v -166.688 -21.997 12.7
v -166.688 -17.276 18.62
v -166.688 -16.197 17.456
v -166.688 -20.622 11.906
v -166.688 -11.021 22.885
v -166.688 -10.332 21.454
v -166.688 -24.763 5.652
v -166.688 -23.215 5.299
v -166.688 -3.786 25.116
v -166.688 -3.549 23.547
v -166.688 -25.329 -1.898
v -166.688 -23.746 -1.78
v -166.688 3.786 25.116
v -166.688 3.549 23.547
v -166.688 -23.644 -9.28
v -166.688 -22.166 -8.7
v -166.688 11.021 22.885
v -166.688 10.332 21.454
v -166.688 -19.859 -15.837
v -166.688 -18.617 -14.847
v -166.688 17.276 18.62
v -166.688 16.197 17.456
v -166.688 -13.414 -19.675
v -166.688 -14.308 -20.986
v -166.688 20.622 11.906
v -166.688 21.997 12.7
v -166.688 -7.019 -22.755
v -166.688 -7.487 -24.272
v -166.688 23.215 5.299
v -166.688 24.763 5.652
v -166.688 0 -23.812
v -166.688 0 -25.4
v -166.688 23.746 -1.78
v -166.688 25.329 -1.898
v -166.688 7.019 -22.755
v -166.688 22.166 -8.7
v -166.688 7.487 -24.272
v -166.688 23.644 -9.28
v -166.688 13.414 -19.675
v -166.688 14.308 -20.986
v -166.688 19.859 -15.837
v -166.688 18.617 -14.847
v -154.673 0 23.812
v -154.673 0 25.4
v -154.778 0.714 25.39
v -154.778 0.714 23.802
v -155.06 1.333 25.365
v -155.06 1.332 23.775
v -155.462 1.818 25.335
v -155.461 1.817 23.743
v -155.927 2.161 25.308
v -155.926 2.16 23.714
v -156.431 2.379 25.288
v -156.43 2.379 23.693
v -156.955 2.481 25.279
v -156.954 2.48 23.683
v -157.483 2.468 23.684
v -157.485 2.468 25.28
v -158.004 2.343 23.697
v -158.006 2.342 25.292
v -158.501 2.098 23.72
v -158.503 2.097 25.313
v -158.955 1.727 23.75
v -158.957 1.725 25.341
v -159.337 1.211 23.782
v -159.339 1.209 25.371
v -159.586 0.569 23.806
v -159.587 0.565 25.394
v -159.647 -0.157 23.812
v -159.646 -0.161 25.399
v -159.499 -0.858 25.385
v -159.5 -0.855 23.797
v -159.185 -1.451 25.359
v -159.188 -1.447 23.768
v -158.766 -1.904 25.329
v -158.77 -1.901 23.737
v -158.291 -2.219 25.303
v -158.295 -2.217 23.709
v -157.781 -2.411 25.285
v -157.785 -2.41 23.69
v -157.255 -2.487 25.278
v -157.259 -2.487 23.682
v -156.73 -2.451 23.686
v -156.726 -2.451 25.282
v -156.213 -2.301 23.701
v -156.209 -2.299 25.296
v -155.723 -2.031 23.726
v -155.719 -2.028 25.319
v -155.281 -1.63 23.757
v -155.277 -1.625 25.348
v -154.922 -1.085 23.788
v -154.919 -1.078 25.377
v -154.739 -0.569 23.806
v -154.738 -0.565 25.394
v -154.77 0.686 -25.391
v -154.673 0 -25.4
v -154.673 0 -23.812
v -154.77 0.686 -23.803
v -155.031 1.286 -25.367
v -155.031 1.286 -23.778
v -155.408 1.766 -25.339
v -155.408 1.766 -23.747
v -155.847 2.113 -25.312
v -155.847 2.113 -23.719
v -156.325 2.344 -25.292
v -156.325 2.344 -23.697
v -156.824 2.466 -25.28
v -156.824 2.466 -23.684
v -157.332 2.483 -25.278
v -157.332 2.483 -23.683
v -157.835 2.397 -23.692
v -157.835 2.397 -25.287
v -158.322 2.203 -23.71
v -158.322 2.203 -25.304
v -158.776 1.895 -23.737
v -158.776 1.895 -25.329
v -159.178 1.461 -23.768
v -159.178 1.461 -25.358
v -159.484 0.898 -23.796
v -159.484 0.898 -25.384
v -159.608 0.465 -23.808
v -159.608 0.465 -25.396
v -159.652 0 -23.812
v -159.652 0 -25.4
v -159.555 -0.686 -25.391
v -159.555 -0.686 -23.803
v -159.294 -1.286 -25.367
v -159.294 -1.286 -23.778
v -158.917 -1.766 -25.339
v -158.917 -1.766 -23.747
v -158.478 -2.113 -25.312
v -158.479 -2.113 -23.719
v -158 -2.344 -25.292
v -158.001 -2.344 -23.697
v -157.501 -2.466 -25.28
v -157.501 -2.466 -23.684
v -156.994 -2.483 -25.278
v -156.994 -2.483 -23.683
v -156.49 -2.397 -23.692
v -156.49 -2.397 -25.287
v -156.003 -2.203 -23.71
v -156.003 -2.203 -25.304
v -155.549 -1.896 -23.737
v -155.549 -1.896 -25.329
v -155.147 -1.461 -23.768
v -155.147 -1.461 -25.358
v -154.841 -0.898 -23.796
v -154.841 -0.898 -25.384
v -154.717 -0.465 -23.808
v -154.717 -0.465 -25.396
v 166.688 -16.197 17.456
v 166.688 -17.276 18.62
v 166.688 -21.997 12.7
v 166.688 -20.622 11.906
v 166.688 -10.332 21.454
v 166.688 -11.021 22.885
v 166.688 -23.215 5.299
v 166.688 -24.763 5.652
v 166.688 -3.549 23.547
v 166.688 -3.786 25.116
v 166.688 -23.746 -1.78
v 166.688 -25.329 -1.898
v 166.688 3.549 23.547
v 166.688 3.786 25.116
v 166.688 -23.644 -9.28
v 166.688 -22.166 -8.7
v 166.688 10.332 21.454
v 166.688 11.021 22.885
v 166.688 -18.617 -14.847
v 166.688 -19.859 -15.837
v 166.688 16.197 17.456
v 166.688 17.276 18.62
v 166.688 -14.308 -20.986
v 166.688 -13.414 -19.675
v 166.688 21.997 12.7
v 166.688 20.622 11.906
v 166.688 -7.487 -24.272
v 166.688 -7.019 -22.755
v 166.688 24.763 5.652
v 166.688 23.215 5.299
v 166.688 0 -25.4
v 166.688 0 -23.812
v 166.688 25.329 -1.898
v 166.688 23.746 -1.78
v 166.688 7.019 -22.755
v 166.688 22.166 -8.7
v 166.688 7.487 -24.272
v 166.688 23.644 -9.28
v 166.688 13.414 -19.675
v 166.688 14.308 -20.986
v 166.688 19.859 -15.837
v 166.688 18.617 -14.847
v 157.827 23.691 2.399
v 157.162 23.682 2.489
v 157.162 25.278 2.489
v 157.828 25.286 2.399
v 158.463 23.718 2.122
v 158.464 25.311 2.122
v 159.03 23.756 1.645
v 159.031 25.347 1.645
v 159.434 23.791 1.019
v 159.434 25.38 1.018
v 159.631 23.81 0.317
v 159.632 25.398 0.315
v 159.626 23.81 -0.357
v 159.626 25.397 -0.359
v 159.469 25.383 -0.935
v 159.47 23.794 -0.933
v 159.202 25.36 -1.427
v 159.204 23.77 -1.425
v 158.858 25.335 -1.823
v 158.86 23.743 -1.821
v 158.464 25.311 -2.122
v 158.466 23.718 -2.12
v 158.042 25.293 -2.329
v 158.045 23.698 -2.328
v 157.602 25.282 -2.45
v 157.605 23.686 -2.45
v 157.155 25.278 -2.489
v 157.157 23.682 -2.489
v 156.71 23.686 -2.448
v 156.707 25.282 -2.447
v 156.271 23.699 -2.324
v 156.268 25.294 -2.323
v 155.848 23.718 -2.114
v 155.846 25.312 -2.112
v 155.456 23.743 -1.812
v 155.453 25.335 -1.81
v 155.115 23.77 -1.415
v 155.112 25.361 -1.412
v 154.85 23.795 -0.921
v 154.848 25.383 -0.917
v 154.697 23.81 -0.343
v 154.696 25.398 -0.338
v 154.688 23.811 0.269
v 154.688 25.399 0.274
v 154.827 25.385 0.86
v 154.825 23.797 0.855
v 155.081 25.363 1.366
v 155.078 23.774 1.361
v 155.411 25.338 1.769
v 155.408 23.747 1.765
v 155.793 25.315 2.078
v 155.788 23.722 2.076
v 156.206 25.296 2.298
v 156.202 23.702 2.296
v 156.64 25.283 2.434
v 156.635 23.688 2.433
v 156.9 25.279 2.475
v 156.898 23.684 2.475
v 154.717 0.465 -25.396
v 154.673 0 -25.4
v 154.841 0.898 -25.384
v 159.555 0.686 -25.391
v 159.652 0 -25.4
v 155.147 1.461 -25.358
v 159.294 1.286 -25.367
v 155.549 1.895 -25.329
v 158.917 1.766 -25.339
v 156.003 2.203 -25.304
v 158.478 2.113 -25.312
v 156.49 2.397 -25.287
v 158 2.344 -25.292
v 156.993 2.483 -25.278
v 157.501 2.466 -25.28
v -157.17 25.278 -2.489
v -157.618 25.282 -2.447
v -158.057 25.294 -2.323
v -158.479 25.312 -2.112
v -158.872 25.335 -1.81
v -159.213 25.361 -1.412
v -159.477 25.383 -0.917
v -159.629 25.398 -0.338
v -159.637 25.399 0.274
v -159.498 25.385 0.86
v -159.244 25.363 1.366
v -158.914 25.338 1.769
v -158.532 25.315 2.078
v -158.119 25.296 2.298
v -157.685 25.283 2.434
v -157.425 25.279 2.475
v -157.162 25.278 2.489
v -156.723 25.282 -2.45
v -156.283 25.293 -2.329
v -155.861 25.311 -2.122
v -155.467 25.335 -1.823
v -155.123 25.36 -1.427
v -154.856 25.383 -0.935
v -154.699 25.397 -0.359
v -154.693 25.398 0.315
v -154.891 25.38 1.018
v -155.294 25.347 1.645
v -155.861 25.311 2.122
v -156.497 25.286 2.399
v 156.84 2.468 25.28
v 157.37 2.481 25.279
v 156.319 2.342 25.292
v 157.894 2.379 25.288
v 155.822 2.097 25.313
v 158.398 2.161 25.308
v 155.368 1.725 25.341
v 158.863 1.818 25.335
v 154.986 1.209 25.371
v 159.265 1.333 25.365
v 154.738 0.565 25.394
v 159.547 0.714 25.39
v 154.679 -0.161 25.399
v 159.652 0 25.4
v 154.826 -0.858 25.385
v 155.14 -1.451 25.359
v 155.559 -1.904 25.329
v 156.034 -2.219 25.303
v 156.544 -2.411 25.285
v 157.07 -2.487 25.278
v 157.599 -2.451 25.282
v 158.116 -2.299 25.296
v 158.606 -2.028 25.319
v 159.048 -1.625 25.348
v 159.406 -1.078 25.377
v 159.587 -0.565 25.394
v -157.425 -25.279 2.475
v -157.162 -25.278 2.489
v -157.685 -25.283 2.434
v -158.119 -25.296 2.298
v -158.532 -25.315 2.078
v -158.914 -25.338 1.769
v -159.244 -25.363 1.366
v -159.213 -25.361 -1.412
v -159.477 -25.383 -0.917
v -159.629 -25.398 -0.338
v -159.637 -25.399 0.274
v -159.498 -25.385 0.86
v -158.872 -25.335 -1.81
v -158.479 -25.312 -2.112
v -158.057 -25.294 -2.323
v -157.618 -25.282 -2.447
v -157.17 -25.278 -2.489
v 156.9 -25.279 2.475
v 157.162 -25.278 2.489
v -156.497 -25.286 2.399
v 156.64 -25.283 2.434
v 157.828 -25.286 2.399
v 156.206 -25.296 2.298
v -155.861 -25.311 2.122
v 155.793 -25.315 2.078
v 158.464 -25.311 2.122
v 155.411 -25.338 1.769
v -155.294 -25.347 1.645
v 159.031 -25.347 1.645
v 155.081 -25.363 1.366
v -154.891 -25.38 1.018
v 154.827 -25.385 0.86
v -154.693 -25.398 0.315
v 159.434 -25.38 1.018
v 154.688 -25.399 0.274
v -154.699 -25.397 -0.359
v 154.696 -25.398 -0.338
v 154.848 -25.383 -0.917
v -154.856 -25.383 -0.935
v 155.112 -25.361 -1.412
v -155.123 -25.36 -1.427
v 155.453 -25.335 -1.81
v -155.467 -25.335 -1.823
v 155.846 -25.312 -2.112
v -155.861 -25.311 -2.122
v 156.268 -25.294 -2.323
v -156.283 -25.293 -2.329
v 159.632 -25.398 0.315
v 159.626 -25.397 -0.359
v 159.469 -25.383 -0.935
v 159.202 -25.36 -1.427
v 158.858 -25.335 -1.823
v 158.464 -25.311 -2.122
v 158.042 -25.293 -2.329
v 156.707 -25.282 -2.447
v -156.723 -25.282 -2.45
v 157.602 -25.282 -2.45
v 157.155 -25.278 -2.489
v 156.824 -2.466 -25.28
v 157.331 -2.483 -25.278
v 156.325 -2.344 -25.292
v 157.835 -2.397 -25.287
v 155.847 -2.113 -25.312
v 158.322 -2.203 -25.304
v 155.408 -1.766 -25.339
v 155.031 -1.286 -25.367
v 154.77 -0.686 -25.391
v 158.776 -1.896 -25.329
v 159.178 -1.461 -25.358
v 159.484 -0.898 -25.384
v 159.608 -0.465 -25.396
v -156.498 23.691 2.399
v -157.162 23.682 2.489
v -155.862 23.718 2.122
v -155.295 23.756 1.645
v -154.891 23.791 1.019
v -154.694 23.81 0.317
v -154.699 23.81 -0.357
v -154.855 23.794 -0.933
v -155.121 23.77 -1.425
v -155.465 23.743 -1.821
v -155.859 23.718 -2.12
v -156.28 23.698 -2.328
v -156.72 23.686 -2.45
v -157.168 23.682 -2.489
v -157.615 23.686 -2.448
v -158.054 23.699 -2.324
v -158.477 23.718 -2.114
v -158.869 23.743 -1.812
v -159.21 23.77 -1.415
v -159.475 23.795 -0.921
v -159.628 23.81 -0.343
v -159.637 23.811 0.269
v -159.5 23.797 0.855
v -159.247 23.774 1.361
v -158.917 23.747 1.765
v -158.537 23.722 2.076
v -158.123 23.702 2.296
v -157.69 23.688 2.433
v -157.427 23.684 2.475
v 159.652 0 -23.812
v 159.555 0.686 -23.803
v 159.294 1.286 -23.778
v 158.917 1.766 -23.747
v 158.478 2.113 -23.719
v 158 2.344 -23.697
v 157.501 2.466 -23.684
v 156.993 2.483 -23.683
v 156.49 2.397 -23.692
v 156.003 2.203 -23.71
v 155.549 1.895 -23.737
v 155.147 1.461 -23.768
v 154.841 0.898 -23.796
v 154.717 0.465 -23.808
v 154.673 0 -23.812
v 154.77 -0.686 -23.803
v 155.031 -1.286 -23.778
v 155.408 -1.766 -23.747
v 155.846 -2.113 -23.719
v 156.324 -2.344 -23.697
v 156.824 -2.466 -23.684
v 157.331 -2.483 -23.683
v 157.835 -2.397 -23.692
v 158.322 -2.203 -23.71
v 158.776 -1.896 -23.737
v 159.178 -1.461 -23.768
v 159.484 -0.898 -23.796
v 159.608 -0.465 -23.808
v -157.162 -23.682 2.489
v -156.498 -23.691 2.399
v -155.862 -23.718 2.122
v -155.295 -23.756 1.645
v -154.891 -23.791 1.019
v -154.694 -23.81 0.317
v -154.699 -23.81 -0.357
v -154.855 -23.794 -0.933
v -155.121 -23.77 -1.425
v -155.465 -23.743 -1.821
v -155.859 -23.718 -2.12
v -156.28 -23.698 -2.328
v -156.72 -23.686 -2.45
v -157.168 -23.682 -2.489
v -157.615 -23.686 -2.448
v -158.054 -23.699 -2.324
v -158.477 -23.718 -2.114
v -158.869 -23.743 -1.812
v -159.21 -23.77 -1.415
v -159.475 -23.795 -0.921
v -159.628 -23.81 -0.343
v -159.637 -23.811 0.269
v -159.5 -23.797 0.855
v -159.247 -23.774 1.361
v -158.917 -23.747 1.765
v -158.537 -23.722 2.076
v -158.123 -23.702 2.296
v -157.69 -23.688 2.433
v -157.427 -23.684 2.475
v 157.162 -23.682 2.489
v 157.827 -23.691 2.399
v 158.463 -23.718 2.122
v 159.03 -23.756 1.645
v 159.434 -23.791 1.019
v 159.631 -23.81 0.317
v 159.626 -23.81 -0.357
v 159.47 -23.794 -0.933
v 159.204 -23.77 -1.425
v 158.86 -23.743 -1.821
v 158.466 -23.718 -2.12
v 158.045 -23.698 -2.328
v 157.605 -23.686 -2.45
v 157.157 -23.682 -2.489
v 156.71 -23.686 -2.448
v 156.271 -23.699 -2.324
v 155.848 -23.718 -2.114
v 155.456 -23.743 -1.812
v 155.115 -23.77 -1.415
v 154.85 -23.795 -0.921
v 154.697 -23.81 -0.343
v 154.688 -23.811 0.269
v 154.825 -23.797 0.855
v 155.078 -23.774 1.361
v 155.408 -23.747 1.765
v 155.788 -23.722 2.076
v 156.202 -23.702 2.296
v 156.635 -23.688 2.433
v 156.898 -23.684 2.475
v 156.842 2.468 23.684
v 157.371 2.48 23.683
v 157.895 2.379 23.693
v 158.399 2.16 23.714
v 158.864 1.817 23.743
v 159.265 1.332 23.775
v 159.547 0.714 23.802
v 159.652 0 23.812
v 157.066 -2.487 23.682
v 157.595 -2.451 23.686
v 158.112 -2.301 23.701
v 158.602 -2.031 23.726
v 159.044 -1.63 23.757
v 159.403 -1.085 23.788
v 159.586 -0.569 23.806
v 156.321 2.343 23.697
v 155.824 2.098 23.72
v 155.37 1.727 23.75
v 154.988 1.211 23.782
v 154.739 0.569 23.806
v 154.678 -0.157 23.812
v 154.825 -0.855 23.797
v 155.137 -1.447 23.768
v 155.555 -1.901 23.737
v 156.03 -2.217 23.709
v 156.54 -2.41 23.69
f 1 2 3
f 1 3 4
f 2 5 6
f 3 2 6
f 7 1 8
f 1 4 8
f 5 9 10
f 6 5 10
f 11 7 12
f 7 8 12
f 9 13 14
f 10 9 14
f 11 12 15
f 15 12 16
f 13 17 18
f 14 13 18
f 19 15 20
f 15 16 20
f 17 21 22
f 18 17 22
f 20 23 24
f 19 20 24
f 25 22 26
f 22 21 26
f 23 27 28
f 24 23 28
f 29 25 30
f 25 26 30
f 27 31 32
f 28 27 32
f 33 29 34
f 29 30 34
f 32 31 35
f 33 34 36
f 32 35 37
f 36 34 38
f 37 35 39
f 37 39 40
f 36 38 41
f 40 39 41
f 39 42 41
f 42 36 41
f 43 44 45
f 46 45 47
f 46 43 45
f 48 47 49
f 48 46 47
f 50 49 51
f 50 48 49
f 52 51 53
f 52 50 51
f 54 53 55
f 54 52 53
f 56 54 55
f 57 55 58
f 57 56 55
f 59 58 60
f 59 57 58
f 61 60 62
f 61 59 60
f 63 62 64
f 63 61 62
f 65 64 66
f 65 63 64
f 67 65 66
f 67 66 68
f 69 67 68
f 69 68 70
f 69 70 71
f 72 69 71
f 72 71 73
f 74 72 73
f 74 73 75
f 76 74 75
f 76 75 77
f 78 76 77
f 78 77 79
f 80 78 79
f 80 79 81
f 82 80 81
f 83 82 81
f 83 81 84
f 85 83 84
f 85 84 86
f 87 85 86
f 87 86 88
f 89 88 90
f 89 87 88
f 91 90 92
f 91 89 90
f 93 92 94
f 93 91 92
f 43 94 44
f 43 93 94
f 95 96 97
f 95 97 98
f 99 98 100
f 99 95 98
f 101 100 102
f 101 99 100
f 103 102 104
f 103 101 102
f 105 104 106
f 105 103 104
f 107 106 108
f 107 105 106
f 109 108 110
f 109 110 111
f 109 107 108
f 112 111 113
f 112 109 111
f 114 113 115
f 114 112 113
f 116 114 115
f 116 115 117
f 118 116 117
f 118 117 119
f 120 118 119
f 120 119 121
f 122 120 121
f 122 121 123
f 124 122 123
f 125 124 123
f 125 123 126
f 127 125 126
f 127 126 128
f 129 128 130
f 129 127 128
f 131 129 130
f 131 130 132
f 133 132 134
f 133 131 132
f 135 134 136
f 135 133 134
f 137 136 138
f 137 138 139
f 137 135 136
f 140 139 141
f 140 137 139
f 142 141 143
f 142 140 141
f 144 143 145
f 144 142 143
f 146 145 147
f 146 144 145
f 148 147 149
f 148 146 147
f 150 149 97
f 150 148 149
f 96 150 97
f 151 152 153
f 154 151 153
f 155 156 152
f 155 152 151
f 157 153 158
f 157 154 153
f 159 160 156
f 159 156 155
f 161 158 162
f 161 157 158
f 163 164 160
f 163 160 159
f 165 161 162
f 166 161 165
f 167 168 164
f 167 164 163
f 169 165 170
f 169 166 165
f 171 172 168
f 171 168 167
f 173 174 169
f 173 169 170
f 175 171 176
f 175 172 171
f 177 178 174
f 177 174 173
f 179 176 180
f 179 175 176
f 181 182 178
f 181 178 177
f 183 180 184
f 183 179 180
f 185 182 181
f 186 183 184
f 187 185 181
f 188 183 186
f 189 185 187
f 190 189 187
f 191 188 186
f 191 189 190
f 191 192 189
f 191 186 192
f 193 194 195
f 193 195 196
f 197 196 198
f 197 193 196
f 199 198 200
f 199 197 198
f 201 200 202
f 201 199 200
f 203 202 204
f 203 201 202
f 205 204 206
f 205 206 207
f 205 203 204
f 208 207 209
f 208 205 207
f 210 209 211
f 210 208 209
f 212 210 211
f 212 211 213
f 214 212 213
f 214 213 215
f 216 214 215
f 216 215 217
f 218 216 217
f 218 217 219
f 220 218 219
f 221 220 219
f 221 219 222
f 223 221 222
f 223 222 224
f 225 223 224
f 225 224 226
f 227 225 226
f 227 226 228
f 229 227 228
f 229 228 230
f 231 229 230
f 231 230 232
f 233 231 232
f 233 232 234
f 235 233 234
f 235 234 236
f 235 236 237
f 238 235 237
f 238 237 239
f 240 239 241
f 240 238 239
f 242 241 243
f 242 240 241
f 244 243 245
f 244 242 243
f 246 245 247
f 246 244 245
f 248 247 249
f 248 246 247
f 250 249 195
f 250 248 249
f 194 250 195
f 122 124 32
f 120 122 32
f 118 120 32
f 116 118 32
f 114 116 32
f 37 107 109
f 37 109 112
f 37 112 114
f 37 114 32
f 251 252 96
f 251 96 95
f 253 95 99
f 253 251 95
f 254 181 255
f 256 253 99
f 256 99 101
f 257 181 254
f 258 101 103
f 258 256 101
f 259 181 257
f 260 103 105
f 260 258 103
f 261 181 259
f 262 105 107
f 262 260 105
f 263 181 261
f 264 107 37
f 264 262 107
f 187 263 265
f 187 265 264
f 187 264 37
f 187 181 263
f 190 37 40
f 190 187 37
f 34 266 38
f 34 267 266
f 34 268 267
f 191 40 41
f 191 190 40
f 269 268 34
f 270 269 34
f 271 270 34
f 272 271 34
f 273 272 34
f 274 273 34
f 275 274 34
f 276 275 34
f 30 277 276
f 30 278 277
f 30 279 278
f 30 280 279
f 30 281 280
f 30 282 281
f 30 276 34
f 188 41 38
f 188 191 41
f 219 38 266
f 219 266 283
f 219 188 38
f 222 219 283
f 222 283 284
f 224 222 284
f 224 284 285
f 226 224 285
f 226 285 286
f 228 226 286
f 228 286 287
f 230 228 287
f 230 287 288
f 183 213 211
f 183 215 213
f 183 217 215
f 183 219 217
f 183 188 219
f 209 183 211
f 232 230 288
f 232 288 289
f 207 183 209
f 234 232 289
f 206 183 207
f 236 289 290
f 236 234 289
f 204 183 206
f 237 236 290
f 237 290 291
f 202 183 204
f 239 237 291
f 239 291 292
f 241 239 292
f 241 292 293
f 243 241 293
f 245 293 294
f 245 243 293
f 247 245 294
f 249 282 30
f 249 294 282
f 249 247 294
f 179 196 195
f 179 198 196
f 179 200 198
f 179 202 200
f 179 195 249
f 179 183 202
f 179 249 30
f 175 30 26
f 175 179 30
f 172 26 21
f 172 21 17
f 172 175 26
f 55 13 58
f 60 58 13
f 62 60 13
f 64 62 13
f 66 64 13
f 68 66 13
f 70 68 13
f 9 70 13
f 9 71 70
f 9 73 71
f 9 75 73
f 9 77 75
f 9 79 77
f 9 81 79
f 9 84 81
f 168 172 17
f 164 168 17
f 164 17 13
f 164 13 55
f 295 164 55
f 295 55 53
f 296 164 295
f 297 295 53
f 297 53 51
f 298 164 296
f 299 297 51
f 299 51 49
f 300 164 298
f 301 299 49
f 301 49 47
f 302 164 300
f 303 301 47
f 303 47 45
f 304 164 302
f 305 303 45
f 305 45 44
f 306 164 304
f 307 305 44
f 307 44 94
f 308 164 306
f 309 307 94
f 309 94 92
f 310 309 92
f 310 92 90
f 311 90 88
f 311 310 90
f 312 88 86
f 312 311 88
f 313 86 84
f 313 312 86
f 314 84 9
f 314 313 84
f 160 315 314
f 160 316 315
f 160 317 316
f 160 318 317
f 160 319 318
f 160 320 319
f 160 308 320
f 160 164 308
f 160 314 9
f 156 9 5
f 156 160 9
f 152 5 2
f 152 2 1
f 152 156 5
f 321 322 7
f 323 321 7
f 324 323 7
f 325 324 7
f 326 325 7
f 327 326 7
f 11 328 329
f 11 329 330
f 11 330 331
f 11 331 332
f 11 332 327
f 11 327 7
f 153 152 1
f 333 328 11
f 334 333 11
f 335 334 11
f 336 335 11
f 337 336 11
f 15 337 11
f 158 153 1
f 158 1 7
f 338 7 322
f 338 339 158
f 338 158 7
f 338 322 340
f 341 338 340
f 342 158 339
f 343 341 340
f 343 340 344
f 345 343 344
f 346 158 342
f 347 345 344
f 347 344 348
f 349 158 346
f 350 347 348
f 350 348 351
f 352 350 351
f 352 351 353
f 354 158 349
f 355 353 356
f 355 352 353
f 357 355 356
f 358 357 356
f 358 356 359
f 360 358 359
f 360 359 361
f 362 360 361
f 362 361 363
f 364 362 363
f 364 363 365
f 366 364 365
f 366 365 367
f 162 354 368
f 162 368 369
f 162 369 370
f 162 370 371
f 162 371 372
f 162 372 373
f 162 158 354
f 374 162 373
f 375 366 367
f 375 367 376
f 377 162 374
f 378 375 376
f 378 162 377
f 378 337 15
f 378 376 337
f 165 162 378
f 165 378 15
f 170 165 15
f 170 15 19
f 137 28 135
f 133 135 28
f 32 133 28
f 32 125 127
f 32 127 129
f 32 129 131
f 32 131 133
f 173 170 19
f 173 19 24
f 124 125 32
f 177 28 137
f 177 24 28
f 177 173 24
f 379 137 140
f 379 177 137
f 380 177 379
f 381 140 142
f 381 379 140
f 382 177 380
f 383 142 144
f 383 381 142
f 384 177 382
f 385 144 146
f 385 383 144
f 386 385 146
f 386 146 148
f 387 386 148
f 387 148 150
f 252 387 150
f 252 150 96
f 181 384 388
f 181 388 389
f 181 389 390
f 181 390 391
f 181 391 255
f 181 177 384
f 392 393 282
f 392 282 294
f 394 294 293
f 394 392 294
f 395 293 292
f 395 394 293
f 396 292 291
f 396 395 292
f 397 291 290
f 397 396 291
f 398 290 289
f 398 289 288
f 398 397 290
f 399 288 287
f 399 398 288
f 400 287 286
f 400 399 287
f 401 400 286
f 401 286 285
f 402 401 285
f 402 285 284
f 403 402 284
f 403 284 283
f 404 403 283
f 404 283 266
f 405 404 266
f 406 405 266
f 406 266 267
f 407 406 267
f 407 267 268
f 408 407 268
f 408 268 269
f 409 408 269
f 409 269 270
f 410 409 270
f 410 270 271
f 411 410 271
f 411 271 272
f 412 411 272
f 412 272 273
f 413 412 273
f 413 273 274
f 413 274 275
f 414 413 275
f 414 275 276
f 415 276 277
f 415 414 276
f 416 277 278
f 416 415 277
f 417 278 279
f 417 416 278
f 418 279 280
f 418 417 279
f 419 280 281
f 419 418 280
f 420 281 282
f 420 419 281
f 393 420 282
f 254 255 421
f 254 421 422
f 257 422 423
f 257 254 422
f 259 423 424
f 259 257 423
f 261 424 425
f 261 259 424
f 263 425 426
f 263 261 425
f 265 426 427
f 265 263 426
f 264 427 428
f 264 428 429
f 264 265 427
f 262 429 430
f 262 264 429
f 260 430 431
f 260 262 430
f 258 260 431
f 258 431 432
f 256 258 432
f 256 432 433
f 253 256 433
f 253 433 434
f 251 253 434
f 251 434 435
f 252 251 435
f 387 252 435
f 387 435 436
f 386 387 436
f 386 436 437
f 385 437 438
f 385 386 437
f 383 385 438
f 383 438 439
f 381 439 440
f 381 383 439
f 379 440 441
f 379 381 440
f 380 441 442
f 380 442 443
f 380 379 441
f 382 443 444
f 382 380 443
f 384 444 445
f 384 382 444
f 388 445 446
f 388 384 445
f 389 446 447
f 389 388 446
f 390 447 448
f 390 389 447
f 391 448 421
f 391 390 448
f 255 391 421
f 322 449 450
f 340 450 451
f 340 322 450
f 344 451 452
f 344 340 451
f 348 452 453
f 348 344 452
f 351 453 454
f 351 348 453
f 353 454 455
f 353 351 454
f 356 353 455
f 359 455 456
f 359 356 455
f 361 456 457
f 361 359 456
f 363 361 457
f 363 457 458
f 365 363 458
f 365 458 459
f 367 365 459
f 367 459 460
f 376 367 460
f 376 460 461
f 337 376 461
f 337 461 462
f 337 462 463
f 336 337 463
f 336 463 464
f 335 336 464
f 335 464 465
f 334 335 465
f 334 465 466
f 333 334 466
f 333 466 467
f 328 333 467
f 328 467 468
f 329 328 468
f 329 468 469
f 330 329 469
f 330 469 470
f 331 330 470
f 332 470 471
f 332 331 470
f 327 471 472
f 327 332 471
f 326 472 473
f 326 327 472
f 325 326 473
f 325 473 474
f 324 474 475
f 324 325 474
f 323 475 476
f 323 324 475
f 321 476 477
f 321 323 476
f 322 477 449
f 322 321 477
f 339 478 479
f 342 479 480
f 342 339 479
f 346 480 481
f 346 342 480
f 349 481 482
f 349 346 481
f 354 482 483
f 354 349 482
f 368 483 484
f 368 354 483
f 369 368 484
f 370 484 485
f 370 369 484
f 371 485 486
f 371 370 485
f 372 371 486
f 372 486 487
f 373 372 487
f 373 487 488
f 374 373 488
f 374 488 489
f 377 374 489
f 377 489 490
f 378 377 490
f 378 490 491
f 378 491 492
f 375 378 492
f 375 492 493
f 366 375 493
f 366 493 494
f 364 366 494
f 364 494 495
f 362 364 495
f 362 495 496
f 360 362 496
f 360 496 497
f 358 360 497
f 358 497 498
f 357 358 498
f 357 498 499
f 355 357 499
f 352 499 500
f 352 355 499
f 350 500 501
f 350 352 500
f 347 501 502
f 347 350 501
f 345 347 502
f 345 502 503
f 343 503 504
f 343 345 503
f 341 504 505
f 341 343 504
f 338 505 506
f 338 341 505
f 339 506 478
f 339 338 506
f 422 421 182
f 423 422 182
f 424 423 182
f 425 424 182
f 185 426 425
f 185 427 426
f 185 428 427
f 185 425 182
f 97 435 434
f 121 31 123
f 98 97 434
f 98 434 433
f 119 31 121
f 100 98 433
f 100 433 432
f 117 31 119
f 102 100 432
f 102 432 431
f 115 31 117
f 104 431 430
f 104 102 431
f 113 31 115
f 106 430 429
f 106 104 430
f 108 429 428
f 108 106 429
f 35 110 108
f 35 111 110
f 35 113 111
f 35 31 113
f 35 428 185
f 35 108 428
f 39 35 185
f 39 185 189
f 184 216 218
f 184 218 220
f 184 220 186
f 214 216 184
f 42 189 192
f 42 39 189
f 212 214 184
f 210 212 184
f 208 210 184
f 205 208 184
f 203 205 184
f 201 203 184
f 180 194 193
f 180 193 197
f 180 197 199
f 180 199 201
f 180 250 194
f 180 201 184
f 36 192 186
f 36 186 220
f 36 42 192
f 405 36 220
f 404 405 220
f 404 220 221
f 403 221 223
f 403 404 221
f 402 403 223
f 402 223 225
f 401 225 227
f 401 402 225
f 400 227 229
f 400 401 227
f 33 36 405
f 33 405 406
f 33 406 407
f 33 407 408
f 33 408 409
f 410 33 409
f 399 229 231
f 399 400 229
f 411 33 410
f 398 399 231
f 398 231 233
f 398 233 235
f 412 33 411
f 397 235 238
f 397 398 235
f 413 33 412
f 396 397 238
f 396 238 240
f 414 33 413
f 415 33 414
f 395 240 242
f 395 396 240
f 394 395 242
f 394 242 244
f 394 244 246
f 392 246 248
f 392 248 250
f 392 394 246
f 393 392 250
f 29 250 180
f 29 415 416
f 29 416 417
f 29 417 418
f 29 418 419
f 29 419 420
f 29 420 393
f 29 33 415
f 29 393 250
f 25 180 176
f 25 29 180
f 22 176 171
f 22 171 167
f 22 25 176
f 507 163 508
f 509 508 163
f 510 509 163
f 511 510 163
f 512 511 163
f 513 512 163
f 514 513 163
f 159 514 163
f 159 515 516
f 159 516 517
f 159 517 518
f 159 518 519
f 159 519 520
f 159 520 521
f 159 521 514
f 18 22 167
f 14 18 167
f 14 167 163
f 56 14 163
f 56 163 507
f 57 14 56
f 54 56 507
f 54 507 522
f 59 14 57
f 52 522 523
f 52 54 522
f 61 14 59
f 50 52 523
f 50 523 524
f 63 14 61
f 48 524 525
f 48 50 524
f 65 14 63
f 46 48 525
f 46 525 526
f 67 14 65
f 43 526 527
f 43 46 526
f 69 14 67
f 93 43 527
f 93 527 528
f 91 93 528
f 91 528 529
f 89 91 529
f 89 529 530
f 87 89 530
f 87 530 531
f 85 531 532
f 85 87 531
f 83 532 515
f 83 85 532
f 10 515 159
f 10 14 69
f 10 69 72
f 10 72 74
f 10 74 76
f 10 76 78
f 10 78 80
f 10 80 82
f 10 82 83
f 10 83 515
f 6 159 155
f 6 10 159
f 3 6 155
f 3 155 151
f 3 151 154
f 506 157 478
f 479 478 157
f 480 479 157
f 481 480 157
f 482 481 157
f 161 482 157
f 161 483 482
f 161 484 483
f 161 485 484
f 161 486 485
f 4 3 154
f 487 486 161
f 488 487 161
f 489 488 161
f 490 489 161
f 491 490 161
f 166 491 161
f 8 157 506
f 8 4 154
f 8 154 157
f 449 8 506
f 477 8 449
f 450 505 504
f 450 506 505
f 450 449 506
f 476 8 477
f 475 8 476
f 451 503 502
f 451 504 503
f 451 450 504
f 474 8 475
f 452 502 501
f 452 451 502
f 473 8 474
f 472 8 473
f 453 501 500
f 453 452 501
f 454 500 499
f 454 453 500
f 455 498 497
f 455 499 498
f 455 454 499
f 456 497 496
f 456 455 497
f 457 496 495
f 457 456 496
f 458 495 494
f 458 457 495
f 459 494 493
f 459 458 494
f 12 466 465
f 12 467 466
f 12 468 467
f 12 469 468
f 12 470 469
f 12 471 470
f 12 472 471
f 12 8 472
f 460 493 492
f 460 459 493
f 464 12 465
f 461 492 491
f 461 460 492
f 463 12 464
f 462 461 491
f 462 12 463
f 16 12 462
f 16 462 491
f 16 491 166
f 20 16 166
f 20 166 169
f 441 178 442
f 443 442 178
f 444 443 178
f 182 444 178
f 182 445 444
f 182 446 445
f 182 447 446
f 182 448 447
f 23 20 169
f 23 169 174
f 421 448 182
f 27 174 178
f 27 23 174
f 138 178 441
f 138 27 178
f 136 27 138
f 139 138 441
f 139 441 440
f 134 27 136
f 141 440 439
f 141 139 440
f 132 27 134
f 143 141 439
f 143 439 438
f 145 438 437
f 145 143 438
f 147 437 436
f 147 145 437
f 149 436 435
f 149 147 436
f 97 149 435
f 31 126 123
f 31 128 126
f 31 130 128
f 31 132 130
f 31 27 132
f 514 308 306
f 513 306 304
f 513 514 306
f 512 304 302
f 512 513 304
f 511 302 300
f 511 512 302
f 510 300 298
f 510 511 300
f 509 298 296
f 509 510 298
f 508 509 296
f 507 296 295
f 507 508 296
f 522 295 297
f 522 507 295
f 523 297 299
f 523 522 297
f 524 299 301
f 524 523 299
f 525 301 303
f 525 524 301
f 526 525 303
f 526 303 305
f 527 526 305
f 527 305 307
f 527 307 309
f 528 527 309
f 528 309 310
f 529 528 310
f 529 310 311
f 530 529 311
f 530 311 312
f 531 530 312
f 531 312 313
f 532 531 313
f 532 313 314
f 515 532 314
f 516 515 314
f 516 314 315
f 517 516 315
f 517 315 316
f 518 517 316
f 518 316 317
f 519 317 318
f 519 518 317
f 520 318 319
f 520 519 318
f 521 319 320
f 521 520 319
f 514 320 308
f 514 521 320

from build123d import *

# Parameters (mm, degrees)
SKETCH1_R               = 25.4
SKETCH1_R_2             = 23.8125
EXTRUDE_THIN1_DEPTH     = 166.6875
CUT_EXTRUDE1_DEPTH      = 171.514054131
CUT_EXTRUDE1_DEPTH_BACK = 171.514054131
SKETCH3_R               = 2.4892
CUT_EXTRUDE2_DEPTH      = 171.514054259
CUT_EXTRUDE2_DEPTH_BACK = 171.514054259
SKETCH4_R               = 2.4892


with BuildPart() as part:
    # Sketch1 → Extrude-Thin1 (new, symmetric)
    with BuildSketch(Plane(origin=(0, 0, 0), x_dir=(0, 0, -1), z_dir=(1, 0, 0))):
        Circle(SKETCH1_R)
        Circle(SKETCH1_R_2, mode=Mode.SUBTRACT)
    extrude(amount=EXTRUDE_THIN1_DEPTH, both=True)

    # Sketch3 → Cut-Extrude1 (cut, two sides: drawn at the far end of the back side and taken through both)
    with BuildSketch(Plane.XY.offset(-CUT_EXTRUDE1_DEPTH_BACK)):
        with Locations((-157.1625, 0)):
            Circle(SKETCH3_R)
        with Locations((157.1625, 0)):
            Circle(SKETCH3_R)
    extrude(amount=CUT_EXTRUDE1_DEPTH + CUT_EXTRUDE1_DEPTH_BACK, mode=Mode.SUBTRACT)

    # Sketch4 → Cut-Extrude2 (cut, two sides: drawn at the far end of the back side and taken through both)
    with BuildSketch(Plane(origin=(0, 0, 0), x_dir=(1, 0, 0), z_dir=(0, 1, 0)).offset(-CUT_EXTRUDE2_DEPTH_BACK)):
        with Locations(Location((-157.1625, 0, 0), (0, 0, 270))):
            Circle(SKETCH4_R)
        with Locations(Location((157.1625, 0, 0), (0, 0, 270))):
            Circle(SKETCH4_R)
    extrude(amount=CUT_EXTRUDE2_DEPTH + CUT_EXTRUDE2_DEPTH_BACK, mode=Mode.SUBTRACT)


solid = part.part
